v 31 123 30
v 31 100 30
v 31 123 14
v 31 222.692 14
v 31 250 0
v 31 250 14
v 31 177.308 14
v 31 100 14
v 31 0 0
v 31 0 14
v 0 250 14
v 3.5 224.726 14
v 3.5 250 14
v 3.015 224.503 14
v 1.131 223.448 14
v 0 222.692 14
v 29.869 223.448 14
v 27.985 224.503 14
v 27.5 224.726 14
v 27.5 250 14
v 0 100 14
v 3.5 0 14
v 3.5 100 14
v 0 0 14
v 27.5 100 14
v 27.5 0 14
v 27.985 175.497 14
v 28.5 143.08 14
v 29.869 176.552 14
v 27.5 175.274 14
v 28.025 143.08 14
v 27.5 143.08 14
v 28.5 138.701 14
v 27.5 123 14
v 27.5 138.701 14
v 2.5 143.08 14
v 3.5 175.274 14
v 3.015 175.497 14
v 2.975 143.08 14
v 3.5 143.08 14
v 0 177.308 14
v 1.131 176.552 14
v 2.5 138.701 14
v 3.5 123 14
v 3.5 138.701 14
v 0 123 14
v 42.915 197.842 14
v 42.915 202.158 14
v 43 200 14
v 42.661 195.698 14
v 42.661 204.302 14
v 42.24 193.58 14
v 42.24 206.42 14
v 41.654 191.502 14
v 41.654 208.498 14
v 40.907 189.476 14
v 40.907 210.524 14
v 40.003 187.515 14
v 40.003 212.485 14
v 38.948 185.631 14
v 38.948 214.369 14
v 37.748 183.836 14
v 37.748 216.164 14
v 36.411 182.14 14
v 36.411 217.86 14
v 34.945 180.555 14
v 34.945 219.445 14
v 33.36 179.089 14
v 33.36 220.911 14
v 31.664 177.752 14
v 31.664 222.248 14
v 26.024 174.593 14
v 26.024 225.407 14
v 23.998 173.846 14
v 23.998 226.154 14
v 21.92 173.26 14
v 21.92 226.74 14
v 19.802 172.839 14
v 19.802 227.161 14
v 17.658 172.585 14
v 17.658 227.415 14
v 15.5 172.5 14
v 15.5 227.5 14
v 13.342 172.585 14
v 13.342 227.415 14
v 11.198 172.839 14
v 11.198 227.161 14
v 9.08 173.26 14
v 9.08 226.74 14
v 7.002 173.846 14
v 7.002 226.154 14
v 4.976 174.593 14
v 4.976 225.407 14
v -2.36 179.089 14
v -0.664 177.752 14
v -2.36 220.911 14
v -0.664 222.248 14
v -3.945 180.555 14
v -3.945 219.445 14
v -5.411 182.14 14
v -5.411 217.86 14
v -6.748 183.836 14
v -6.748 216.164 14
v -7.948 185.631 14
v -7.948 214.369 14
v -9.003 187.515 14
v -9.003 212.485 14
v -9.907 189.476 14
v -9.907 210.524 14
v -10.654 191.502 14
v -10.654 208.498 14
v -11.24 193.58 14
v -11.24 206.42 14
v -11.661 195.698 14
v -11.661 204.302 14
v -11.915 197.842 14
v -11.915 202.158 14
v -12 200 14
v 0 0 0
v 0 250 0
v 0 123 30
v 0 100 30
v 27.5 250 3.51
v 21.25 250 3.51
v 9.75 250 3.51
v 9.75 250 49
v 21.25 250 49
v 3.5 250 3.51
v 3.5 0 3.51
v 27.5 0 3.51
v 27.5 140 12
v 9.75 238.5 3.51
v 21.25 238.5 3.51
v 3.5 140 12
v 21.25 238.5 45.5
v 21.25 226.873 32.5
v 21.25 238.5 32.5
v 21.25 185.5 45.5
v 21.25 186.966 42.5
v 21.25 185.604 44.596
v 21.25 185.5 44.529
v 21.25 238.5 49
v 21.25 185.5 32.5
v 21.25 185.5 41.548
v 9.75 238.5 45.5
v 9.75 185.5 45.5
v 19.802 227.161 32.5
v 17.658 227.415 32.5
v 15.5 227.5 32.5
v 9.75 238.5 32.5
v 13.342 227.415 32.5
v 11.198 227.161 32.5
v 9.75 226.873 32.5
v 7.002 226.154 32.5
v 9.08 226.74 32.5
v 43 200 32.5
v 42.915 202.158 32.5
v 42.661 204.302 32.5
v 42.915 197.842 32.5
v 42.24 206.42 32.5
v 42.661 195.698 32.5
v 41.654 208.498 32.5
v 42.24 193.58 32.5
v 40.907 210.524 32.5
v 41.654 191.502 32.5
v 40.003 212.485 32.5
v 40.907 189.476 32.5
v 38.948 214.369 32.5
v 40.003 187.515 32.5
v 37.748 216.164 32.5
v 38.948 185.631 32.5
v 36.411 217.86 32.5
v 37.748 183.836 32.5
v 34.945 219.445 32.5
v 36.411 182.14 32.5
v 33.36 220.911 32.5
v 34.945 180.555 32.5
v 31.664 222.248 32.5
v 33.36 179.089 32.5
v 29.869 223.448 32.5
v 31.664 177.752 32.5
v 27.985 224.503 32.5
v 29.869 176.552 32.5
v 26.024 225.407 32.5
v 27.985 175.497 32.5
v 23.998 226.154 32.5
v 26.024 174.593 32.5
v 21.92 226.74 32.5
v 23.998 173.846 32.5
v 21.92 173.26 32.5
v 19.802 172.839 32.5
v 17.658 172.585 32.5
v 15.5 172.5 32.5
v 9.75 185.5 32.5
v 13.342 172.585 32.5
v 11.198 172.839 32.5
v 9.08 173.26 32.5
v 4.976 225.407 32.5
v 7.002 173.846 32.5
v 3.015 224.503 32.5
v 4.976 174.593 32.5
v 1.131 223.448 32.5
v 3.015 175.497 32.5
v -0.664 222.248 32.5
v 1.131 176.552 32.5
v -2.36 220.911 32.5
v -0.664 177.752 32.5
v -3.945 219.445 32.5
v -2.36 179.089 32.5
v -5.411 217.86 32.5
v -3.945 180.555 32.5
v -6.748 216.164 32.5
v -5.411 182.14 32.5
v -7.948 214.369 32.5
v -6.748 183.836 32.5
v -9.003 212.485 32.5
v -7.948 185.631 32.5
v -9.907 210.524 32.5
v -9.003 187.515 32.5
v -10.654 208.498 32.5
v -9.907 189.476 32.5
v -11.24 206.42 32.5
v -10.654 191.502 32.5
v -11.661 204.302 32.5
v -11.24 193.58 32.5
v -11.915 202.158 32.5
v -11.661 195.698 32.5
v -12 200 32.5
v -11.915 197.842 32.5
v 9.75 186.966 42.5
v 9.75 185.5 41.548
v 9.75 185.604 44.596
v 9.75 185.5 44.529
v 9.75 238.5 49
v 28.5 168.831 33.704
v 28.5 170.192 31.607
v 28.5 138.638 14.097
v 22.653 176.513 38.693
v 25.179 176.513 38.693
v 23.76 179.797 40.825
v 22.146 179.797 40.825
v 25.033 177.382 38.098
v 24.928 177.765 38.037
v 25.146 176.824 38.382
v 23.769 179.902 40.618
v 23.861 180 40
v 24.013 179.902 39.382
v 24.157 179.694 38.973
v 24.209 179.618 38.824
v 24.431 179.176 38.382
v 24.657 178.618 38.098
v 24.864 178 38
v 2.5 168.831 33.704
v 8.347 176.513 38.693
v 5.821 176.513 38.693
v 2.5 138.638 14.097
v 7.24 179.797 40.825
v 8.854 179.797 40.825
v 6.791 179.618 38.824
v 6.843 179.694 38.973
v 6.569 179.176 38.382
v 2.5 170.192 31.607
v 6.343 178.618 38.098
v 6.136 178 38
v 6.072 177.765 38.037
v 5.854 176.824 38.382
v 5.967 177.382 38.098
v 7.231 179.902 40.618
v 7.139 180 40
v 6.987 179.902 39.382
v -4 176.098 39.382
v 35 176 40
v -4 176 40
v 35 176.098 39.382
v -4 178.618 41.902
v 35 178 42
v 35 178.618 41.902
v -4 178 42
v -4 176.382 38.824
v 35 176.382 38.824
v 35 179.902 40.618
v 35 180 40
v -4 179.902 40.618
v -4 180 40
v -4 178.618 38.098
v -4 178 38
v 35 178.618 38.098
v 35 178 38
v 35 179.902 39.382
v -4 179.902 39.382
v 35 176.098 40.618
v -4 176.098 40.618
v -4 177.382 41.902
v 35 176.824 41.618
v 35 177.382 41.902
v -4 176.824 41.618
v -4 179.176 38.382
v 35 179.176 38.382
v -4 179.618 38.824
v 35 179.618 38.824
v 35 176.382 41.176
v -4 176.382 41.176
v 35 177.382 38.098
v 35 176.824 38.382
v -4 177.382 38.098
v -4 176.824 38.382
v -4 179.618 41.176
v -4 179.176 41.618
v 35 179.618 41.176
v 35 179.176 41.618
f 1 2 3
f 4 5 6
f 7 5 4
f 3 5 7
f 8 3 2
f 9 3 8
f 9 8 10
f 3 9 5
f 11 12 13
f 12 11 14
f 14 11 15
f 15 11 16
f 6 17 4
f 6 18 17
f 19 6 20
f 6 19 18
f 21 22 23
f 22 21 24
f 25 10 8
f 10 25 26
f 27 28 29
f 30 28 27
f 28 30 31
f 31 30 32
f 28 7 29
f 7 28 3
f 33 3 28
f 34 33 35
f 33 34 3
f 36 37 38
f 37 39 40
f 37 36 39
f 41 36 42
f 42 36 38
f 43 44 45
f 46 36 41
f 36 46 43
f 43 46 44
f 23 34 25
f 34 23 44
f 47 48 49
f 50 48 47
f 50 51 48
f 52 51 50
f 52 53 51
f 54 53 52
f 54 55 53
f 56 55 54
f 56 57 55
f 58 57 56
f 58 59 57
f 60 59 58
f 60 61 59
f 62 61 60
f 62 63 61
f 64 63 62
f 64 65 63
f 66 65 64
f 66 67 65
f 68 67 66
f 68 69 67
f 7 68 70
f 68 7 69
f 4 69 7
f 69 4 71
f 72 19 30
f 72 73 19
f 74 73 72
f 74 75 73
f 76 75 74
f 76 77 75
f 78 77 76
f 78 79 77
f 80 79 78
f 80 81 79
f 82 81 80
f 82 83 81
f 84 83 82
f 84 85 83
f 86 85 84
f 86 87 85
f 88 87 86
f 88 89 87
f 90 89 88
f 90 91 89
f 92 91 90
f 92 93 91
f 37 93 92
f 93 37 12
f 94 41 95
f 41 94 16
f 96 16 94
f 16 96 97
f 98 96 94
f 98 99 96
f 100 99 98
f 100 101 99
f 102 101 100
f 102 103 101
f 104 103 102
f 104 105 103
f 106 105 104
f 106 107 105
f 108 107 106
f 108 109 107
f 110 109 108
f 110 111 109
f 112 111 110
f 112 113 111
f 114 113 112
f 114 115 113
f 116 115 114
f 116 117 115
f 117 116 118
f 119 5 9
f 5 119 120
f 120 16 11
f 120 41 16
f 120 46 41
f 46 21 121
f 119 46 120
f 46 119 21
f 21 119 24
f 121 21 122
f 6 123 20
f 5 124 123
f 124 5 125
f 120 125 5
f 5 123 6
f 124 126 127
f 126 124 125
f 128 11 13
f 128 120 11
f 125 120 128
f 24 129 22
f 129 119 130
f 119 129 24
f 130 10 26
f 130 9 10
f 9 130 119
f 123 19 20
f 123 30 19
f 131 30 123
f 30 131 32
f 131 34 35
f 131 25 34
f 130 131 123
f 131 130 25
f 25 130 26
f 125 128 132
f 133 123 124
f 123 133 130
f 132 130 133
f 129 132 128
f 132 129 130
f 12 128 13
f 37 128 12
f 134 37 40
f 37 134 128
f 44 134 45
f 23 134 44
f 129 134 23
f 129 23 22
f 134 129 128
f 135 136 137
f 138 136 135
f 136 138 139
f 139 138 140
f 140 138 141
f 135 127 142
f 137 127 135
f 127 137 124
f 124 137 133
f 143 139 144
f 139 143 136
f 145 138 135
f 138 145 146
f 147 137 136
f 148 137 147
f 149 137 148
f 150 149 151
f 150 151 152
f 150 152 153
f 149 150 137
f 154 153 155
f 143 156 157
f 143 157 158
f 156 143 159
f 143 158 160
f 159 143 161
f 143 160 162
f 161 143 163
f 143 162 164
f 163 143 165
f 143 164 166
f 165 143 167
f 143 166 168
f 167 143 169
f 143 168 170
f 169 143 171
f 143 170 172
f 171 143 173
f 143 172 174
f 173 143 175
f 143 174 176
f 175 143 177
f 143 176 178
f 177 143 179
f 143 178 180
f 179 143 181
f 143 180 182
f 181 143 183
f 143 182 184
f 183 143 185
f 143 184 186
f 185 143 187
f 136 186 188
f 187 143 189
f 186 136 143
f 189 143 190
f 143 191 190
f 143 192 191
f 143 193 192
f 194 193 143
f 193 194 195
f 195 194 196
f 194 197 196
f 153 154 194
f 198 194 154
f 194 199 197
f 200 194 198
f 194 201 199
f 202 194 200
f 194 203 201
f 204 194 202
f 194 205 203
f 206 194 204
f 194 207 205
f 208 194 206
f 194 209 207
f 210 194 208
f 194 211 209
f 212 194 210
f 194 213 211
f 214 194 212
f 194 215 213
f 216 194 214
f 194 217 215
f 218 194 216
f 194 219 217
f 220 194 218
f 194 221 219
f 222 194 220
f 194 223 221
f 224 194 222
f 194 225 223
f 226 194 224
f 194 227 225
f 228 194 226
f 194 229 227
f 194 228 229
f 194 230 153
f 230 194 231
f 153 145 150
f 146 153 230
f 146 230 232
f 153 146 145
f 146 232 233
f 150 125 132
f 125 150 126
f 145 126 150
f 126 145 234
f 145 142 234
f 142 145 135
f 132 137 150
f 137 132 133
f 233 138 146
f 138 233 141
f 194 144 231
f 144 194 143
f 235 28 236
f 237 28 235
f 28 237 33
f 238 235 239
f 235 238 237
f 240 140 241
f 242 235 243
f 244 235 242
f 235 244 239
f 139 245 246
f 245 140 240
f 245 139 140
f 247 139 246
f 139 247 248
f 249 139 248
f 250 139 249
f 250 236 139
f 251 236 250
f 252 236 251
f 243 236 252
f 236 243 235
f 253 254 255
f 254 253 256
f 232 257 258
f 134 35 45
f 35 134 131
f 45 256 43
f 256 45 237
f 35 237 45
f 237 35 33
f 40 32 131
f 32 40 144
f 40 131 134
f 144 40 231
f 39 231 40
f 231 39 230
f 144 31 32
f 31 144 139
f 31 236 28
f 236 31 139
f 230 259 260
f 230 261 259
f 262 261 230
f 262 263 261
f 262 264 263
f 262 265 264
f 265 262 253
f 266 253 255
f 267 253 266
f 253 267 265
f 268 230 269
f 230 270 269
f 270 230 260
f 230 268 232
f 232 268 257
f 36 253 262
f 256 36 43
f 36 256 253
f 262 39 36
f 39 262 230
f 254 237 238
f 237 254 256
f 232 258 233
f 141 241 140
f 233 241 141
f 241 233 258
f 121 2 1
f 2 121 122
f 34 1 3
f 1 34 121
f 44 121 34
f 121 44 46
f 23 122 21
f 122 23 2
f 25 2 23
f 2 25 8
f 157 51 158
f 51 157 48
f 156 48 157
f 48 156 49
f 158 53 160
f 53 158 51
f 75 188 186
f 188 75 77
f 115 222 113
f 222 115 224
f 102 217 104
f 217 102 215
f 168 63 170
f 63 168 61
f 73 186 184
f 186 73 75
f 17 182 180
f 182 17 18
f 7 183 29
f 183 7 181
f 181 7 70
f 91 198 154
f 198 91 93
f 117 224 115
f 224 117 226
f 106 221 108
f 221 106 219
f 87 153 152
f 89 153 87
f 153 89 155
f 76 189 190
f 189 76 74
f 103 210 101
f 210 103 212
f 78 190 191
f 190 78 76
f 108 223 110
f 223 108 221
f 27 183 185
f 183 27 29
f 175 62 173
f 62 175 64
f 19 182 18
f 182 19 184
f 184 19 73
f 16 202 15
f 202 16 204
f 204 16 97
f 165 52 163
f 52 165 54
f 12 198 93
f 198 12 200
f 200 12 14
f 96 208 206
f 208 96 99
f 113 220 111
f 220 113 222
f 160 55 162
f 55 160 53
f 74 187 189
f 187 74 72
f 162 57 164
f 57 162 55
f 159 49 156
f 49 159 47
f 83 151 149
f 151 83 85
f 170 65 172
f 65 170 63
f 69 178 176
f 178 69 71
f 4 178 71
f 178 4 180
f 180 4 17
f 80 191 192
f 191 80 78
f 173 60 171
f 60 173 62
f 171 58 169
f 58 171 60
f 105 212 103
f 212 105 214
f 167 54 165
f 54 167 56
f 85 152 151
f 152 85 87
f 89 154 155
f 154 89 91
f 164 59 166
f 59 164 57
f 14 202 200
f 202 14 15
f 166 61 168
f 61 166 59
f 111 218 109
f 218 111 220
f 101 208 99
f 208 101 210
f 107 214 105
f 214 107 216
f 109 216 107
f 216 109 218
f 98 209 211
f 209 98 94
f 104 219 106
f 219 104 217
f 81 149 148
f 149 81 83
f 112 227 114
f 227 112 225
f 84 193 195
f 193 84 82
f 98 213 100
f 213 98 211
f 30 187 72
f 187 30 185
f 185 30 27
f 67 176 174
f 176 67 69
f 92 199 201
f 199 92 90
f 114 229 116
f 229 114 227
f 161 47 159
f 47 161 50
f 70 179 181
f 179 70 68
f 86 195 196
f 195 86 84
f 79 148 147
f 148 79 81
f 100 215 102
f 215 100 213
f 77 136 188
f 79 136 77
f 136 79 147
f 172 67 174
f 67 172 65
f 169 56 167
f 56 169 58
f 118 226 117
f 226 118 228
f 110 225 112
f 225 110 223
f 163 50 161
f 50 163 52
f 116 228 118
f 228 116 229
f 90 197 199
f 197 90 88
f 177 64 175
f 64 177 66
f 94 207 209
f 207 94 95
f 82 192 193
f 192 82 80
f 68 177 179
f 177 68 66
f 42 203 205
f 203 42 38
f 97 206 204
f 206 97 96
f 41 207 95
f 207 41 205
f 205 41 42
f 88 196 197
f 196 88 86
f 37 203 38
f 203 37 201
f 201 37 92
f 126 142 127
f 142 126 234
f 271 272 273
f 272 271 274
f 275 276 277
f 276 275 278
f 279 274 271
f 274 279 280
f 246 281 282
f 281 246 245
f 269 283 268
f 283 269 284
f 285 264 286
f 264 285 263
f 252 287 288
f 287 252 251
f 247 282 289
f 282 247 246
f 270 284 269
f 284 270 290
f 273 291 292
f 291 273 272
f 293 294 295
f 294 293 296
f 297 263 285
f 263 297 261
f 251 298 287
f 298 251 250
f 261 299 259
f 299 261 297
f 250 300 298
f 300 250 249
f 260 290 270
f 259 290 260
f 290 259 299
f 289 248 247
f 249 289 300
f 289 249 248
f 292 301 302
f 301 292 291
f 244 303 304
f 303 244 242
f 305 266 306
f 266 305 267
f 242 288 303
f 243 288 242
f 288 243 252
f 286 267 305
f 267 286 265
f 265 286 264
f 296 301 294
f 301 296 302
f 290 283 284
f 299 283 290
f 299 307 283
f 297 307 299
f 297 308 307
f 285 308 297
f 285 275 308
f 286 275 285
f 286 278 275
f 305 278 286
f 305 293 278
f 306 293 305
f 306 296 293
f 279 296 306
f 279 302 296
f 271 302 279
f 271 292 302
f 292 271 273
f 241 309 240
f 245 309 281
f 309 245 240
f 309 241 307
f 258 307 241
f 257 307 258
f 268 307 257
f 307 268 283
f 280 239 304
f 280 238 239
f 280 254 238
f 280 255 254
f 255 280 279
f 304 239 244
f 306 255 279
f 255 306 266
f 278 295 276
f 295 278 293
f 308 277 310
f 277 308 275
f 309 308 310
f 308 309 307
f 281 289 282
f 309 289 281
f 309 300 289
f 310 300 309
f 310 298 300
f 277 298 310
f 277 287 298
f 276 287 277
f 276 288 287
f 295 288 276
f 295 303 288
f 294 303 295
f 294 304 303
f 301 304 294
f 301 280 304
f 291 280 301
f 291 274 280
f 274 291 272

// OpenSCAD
base_length = 250;
base_width = 31;
base_height = 14;

seat_width = base_width;
seat_length = 23;
seat_height = 16;

drum_height = 18.5;
drum_d = 55;

module foot_rest() {
  foot_rest_width = 26;
  hull() {
    cube([foot_rest_width, 36, 2.5]);

    translate([foot_rest_width / 2 - 11.5 / 2, 54, 0])
      cube([11.5, 2, 2.5]);
  }
}

difference() {
  cube([base_width, base_length, base_height]);

  translate([3.5, 0, 3.51])
    cube([base_width - 7, base_length, base_height - 3.5]);
}

translate([0, 100, base_height])
  cube([seat_width, seat_length, seat_height]);

translate([base_width / 2, 200, base_height])
  cylinder(h=drum_height, d=drum_d, $fn=80);

translate([base_width / 2 - 11.5 / 2, base_length - 11.5, 0])
  cube([11.5, 11.5, 49]);

top_length = 53;

union() {
  translate([base_width / 2 - 11.5 / 2, base_length - 11.5 - top_length, 32.5])
    cube([11.5, top_length, 13]);

  translate([base_width / 2 - 26 / 2, 140, base_height - 2])
    rotate([33, 0, 0])
      foot_rest();
}

translate([base_width / 2 - 39 / 2, 178, 40])
  rotate([0, 90, 0])
    cylinder(h = 39, d = 4, $fn = 20);
